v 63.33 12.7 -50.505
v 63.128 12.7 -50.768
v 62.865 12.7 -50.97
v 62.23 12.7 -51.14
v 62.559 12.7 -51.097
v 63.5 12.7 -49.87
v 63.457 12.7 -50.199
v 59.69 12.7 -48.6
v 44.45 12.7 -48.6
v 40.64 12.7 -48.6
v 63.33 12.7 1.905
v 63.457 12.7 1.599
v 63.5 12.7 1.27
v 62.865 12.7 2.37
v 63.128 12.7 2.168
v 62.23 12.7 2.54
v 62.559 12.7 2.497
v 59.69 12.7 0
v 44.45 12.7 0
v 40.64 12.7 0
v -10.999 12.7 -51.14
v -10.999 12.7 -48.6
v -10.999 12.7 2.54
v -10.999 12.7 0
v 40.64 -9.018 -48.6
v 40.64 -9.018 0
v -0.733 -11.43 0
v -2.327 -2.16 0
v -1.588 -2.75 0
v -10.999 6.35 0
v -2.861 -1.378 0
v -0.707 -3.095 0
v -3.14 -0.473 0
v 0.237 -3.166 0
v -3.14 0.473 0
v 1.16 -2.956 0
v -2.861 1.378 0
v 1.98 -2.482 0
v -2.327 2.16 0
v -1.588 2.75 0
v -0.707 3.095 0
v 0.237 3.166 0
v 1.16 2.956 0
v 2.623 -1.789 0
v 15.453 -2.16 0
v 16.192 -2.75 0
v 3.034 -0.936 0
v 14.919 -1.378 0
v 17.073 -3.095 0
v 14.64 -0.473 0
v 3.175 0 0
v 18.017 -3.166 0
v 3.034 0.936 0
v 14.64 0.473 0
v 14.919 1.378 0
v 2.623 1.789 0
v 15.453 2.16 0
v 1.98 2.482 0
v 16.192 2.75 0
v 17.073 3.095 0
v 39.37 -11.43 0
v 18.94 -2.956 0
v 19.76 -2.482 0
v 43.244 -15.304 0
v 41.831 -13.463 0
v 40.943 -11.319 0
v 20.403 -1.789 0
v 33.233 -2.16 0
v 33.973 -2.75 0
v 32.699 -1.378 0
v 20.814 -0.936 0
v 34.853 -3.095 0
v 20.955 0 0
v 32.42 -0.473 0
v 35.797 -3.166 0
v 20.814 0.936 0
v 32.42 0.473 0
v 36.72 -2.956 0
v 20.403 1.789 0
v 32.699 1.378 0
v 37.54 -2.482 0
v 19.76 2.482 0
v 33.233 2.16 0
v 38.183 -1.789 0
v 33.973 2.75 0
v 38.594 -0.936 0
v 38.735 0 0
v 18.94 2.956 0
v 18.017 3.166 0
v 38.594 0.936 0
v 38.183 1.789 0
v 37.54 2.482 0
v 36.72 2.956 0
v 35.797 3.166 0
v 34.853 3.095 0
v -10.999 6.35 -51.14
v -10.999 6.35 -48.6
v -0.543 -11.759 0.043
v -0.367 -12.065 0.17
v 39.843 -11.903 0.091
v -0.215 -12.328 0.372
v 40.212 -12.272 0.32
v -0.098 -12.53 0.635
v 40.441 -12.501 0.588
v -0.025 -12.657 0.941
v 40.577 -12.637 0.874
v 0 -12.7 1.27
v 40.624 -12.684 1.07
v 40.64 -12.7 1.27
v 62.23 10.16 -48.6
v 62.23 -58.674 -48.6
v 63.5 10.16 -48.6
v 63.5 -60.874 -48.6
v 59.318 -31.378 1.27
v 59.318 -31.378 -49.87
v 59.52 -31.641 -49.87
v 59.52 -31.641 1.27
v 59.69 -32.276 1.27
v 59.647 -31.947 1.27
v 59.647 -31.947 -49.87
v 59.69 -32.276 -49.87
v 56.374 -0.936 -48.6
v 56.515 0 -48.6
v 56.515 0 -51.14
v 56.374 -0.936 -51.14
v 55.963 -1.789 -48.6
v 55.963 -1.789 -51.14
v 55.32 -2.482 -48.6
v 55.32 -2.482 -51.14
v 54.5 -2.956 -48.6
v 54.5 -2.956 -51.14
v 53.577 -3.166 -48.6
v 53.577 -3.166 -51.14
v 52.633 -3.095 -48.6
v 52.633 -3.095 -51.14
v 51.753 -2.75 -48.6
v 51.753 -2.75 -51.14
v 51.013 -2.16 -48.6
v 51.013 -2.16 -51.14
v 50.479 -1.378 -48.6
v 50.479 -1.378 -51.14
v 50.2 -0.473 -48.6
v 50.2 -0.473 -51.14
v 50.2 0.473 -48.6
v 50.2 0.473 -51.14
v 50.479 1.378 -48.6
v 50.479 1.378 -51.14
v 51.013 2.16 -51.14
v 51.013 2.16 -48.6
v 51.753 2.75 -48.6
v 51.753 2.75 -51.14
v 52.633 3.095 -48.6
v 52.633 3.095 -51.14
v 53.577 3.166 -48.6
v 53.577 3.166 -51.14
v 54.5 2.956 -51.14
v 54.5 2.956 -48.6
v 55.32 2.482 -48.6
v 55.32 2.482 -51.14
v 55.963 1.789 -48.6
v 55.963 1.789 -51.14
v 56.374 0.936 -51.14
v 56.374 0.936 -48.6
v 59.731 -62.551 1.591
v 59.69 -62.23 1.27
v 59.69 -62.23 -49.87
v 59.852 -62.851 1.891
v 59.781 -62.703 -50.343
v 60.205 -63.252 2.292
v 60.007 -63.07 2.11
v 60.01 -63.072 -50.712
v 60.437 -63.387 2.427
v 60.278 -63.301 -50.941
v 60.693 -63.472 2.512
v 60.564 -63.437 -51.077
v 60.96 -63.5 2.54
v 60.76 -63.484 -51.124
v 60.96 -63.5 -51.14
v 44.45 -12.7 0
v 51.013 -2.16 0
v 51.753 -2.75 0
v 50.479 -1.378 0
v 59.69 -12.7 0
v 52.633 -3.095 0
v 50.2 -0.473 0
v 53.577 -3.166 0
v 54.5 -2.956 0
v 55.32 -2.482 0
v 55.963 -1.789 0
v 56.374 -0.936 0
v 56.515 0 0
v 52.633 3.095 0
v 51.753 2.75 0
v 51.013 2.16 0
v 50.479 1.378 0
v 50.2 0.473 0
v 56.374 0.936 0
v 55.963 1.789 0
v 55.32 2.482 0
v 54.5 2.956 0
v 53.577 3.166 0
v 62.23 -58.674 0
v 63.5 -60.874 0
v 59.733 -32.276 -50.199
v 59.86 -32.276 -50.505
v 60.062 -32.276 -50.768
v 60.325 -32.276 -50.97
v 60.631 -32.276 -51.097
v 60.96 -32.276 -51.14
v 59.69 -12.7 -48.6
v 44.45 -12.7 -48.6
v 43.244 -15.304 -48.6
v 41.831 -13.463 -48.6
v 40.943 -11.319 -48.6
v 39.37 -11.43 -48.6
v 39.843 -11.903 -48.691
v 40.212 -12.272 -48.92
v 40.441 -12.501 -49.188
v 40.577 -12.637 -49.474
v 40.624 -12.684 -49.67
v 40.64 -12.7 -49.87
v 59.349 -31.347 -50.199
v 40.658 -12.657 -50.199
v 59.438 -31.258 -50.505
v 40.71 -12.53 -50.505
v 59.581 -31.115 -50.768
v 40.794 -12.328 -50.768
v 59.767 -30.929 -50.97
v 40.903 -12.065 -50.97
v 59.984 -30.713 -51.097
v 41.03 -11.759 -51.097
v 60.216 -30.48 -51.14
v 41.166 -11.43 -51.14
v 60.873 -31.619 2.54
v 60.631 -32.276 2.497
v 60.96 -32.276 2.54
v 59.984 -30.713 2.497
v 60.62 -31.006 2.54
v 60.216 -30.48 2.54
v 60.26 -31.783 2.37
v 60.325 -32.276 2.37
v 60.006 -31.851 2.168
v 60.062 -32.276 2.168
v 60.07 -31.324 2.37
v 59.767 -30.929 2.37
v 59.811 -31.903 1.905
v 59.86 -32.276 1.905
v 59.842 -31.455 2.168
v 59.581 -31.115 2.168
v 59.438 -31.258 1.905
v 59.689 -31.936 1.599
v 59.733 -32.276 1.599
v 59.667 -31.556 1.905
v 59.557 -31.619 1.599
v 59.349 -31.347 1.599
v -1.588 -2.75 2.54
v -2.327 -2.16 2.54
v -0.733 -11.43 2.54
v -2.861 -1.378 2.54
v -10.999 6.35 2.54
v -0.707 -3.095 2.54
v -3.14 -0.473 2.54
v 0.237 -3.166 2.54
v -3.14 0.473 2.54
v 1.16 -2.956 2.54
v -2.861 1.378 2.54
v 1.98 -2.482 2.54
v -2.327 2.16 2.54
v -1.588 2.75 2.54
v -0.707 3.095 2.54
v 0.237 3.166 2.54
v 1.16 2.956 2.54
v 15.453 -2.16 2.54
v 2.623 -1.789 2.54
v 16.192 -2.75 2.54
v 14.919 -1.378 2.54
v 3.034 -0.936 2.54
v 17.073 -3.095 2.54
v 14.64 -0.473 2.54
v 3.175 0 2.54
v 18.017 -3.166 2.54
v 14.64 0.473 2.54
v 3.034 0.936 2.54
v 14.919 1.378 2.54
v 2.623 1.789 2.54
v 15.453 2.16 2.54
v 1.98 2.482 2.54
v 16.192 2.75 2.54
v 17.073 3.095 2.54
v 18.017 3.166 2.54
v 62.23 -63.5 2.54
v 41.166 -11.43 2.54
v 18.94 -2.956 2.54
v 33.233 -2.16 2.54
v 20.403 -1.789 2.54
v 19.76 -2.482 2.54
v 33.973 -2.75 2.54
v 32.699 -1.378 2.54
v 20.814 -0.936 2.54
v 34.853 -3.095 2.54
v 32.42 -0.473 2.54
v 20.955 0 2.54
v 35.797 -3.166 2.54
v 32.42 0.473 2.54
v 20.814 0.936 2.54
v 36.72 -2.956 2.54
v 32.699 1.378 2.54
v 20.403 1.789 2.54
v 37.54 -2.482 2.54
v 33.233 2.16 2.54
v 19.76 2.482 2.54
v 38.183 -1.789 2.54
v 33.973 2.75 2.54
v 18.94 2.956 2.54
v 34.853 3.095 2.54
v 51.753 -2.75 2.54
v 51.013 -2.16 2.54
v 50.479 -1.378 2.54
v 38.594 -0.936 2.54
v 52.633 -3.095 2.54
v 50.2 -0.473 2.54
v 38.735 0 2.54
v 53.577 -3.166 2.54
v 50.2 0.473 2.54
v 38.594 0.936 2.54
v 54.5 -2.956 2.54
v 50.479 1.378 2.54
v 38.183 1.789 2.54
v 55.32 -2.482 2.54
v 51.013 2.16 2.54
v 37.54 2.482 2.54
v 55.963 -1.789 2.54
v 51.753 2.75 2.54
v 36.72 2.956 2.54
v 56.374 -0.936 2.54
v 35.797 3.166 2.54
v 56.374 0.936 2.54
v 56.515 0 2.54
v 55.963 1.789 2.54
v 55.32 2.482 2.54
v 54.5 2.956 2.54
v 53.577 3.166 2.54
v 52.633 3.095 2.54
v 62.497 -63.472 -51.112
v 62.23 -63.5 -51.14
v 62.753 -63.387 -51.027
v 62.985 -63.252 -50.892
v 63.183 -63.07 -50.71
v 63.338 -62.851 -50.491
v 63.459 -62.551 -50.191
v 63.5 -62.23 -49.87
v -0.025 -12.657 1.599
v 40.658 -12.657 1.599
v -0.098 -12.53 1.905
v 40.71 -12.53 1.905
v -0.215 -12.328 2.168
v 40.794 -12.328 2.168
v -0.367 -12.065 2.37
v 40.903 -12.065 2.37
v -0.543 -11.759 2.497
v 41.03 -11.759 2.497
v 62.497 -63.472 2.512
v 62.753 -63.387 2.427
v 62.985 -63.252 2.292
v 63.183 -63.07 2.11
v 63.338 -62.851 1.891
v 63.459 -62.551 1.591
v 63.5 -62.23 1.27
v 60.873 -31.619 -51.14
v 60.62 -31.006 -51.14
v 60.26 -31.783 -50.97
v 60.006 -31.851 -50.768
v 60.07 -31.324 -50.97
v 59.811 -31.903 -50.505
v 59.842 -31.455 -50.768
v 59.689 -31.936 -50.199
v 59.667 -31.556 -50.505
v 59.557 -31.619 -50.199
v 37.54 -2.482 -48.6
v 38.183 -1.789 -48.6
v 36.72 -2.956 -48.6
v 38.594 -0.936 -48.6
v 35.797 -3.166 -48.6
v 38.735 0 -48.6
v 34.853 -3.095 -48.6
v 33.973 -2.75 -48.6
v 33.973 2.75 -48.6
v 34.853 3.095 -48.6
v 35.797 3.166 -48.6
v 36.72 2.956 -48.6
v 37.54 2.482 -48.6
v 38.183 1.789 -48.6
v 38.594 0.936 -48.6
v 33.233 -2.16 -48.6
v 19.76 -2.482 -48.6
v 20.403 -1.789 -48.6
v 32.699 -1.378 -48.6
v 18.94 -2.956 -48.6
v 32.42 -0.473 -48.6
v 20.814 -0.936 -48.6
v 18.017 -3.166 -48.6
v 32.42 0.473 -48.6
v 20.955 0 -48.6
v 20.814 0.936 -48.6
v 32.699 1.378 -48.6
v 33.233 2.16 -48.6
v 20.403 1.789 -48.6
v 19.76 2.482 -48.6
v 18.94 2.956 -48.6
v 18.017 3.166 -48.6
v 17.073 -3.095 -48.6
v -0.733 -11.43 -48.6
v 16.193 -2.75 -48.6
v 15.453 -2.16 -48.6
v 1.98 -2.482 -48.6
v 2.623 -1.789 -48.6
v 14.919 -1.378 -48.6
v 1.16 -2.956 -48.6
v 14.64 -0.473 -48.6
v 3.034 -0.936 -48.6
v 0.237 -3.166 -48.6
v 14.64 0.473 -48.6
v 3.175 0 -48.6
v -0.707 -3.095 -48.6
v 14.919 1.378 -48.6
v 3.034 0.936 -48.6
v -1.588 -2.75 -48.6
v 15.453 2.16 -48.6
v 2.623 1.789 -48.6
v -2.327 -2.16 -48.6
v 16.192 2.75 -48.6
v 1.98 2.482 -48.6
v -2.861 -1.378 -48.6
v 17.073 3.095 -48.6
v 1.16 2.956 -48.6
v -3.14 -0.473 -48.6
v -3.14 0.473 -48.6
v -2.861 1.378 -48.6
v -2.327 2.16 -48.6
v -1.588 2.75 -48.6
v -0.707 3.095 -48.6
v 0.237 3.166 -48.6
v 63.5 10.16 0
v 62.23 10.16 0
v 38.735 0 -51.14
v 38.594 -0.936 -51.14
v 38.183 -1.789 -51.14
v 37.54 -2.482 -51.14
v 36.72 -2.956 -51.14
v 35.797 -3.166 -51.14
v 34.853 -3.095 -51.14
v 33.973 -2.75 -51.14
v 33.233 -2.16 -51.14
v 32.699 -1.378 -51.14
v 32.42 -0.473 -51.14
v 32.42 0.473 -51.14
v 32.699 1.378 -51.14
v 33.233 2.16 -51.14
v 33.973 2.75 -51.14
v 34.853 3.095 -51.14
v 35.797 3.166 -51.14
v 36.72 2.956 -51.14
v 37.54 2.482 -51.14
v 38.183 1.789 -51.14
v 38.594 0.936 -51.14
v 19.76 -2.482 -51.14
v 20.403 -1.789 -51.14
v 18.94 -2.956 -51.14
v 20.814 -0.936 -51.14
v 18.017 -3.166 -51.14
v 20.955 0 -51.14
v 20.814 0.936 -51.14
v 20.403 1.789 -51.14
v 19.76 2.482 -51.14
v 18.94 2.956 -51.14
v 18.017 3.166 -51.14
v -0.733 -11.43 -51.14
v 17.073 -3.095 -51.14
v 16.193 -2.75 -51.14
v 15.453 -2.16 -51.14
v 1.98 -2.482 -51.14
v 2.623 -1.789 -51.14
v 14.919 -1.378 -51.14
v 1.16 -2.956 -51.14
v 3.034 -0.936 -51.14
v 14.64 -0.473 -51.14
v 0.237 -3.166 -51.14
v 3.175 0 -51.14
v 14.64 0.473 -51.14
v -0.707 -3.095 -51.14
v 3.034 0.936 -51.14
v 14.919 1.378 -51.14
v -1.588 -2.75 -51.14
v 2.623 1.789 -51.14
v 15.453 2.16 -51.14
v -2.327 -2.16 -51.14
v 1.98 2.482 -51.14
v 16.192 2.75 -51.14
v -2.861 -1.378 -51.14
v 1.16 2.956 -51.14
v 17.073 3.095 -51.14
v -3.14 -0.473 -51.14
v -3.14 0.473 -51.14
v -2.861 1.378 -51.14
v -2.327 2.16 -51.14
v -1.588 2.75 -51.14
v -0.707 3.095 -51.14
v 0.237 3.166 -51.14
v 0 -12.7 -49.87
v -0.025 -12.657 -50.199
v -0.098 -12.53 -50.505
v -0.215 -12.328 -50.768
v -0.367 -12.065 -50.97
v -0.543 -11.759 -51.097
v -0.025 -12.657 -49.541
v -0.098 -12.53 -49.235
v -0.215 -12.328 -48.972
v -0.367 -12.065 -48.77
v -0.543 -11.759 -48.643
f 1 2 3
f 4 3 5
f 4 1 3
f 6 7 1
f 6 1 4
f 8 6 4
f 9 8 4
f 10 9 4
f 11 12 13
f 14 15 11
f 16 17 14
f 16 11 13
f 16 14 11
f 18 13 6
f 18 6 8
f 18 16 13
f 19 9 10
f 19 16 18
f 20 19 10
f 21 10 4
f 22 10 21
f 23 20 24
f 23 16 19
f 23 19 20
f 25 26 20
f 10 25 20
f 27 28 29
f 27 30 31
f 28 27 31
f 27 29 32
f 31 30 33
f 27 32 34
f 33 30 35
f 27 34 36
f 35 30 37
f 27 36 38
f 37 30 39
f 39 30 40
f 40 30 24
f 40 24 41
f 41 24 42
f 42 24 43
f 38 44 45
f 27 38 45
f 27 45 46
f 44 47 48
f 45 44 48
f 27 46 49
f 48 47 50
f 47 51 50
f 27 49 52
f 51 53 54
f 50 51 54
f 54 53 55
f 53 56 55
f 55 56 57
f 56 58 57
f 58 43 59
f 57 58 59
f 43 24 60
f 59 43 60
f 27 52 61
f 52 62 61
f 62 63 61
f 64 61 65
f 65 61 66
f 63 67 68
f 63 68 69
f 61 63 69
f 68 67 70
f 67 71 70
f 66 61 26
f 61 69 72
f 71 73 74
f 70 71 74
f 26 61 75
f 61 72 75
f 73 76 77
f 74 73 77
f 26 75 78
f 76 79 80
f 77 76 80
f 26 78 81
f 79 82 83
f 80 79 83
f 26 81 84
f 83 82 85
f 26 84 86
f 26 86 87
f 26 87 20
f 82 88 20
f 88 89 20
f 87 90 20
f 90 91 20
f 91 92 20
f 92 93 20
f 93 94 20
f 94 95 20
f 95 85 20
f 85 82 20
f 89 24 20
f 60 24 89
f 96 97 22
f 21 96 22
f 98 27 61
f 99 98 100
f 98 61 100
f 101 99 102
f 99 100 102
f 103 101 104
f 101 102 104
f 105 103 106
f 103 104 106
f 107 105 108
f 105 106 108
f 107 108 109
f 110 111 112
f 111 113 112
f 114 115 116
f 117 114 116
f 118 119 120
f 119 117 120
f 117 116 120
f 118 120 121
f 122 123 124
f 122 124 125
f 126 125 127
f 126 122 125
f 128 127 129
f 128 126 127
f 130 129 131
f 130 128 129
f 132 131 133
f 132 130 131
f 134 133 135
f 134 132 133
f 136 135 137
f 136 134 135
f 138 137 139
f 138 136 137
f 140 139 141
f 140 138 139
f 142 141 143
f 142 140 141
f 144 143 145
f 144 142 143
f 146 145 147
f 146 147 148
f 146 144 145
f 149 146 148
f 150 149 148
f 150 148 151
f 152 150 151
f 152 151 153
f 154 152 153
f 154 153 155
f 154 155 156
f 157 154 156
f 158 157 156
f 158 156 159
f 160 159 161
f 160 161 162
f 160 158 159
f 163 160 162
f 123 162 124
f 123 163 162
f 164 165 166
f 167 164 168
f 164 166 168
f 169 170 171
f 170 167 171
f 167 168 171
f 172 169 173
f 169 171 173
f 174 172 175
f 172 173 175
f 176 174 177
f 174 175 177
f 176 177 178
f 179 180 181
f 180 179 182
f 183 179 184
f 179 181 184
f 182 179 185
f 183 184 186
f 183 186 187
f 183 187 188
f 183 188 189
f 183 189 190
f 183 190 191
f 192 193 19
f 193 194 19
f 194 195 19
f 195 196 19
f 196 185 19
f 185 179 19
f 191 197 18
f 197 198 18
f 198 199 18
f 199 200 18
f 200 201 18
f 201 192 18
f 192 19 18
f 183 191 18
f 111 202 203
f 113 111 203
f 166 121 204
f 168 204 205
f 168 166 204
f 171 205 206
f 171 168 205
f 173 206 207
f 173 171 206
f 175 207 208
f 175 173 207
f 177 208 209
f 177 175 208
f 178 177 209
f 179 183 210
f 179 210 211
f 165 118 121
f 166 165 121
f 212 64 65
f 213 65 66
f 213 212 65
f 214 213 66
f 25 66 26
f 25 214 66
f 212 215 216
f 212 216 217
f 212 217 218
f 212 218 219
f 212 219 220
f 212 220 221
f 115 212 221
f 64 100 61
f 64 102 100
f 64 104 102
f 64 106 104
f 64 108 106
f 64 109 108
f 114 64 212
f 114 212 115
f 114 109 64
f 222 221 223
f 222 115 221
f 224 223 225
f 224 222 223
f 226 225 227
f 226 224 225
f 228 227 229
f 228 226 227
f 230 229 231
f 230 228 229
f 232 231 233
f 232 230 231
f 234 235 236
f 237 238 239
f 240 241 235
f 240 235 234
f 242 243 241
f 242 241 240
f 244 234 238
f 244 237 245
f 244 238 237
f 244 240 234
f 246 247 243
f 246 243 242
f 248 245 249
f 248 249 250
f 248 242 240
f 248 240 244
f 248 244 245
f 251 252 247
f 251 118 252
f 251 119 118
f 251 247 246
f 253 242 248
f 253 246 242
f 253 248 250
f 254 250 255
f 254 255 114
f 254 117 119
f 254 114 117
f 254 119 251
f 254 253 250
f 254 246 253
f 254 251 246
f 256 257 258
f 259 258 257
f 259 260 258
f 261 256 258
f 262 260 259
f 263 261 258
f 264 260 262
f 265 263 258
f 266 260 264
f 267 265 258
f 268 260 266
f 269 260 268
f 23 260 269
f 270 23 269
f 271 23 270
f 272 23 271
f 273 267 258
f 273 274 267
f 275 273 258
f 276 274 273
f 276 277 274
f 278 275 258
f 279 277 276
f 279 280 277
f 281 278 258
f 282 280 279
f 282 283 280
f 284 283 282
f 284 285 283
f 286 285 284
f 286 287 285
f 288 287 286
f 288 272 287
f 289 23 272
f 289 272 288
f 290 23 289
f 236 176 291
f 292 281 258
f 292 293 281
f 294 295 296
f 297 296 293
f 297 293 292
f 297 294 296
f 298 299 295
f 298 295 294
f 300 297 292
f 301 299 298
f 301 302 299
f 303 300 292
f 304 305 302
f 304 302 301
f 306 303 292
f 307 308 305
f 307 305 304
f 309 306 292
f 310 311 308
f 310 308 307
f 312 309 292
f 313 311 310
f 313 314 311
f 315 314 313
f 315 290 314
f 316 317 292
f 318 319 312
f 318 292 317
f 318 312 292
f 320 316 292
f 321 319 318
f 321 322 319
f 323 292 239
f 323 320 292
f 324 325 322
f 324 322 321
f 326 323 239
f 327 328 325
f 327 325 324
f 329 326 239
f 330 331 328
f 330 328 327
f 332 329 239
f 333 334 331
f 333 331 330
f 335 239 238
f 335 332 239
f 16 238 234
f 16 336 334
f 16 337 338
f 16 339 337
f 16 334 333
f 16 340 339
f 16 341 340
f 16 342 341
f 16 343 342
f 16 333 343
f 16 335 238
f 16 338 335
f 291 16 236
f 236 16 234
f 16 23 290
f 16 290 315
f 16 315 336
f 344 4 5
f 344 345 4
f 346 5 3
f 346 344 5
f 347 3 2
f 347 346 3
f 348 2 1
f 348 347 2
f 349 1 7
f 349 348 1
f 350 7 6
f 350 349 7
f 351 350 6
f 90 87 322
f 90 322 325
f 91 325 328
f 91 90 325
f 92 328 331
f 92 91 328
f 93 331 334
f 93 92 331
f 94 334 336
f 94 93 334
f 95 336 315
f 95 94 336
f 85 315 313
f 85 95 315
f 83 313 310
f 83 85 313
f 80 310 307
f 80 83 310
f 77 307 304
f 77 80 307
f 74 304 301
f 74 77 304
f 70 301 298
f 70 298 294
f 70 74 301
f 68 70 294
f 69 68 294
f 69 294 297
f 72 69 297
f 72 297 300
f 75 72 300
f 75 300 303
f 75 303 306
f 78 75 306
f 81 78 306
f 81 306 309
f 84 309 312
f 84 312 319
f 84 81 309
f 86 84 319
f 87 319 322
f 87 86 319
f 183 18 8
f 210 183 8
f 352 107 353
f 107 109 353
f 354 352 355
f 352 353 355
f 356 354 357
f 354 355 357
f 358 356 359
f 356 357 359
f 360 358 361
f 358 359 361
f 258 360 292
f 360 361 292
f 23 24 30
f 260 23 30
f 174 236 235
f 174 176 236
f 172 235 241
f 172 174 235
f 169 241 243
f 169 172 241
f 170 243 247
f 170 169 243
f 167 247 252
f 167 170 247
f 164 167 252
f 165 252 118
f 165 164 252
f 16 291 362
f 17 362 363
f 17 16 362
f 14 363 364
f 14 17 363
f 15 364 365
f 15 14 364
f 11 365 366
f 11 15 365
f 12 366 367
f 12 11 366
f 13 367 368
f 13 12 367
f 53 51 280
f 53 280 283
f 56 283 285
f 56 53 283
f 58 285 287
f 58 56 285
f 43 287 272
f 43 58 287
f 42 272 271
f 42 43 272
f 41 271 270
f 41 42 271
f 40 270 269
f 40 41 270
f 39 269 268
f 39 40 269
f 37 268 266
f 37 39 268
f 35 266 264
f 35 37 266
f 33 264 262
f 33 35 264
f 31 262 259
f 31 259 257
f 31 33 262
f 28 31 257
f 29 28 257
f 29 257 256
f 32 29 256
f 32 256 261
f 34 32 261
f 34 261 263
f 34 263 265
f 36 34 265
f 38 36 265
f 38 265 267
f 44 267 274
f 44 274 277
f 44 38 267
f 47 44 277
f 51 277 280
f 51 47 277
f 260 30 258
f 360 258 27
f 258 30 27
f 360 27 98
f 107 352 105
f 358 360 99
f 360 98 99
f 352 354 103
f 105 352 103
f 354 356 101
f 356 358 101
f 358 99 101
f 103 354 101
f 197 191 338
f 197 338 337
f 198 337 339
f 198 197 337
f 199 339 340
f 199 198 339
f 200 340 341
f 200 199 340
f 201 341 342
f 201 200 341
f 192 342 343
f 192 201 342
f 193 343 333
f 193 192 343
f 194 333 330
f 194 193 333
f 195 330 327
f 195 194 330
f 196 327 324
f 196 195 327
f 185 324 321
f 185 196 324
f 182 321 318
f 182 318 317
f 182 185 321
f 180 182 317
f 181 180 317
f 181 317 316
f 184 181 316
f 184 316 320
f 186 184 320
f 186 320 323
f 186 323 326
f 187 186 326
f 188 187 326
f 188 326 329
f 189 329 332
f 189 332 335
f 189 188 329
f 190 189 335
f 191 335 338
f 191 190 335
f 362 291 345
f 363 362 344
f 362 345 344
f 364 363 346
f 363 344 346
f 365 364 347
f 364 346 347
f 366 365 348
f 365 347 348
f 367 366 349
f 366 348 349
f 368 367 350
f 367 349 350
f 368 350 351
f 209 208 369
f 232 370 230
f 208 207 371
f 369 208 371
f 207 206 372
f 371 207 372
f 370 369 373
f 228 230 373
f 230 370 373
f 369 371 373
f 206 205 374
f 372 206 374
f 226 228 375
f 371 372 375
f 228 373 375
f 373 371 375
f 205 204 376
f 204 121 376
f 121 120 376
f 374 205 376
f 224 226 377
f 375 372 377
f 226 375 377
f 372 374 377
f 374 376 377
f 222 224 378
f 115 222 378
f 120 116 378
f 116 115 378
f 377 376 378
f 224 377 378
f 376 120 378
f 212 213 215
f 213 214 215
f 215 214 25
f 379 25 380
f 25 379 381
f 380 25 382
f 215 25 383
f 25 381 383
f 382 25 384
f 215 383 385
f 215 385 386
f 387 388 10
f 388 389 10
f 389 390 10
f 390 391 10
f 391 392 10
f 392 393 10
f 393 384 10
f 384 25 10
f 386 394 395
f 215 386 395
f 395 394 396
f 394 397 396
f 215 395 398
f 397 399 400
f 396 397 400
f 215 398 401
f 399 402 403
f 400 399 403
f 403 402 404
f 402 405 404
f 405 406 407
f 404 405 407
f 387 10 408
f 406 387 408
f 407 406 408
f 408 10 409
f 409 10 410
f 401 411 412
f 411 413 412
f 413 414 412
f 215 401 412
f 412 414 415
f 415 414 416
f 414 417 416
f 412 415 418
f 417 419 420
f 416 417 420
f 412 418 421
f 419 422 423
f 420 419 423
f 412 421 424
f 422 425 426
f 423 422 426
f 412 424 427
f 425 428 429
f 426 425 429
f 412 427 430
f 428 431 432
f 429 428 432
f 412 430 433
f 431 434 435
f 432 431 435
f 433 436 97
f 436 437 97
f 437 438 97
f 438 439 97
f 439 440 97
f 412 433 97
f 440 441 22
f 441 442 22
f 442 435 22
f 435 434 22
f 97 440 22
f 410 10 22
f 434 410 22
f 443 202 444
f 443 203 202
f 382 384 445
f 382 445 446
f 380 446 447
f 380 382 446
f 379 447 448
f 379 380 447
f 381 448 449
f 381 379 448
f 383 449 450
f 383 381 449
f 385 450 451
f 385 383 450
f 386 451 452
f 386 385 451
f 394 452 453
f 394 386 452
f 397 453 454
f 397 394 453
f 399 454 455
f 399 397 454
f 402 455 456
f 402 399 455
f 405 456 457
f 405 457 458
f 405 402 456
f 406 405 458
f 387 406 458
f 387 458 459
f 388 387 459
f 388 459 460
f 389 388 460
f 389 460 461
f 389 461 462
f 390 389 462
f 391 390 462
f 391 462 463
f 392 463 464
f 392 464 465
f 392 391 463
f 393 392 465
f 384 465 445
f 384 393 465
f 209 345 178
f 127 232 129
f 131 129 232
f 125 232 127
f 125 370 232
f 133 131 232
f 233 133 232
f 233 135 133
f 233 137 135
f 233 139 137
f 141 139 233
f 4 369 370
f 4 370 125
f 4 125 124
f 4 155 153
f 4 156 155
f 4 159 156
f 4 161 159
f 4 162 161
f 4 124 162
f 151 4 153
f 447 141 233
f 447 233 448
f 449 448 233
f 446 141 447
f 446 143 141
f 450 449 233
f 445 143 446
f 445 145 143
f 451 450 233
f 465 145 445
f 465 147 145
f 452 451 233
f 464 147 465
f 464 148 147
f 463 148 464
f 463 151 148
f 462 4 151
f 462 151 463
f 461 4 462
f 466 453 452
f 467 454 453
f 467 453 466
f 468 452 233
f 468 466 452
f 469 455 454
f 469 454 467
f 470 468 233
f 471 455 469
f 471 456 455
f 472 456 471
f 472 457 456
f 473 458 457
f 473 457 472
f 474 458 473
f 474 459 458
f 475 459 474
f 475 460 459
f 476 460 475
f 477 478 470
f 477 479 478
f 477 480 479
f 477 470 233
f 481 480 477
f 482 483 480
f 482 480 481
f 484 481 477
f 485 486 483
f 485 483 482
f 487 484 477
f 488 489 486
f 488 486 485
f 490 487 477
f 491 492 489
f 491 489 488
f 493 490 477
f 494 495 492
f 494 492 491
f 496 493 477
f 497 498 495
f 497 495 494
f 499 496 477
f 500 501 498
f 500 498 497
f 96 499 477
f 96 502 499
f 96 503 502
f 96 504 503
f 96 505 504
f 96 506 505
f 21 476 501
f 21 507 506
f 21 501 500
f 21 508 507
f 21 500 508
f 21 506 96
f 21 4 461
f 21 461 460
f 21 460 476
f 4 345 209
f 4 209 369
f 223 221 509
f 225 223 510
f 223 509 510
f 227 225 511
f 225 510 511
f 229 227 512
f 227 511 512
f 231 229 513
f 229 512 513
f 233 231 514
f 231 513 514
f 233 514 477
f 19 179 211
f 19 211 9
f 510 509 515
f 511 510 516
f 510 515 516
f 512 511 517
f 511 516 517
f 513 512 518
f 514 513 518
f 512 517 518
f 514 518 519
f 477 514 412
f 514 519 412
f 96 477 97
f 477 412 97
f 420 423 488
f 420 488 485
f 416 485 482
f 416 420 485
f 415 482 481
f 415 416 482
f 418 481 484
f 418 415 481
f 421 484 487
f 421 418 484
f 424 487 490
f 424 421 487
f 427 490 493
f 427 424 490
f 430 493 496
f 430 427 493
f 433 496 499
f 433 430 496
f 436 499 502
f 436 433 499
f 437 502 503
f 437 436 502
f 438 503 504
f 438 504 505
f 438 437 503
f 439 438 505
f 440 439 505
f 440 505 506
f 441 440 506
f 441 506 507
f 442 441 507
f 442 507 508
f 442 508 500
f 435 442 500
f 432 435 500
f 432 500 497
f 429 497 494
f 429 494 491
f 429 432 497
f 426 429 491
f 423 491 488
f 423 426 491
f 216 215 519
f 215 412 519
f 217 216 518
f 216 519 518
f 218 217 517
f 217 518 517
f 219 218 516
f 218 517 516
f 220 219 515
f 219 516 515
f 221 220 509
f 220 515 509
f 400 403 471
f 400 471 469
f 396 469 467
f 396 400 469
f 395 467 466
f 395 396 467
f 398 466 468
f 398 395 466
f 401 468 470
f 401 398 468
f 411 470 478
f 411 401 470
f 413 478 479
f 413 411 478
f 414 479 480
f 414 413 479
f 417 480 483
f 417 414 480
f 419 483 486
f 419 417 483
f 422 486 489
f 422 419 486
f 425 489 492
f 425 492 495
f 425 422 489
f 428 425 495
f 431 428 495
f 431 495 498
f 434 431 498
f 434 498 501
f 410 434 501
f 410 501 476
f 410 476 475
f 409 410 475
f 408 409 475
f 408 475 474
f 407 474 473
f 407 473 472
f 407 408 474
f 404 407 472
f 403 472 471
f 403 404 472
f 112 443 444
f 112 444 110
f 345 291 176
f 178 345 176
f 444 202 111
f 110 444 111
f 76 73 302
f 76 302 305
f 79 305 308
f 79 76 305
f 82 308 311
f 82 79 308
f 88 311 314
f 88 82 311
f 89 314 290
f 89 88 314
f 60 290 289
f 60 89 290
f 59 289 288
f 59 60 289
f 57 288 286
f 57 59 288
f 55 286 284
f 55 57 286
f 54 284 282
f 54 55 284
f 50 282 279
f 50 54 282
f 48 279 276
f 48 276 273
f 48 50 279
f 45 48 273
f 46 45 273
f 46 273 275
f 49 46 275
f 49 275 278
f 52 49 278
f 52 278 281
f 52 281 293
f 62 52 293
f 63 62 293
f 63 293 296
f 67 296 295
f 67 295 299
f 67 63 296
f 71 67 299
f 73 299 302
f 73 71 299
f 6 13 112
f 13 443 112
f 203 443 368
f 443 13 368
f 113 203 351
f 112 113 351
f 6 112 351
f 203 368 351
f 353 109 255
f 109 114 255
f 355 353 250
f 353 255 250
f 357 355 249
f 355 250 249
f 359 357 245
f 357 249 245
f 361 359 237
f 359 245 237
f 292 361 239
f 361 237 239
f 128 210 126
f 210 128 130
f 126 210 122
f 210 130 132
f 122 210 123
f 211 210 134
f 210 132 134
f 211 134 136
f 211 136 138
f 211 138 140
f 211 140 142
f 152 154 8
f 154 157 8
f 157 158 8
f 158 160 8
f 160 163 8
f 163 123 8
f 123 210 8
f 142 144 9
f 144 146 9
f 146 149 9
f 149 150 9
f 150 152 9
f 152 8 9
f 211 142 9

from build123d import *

# Parameters (mm, degrees)
SKETCH2_R           = 3.175
BOSS_EXTRUDE1_DEPTH = 2.54
SKETCH3_R           = 3.175
BOSS_EXTRUDE2_DEPTH = 2.54
SKETCH4_W           = 3.81
SKETCH4_H           = 25.4
BOSS_EXTRUDE3_DEPTH = 48.6
BOSS_EXTRUDE4_DEPTH = 50.8
LPATTERN1_COUNT     = 2
LPATTERN1_PITCH     = 19.05
SKETCH6_W           = 48.6
SKETCH6_H           = 71.12
CUT_EXTRUDE1_DEPTH  = 1.27
BOSS_EXTRUDE5_REACH = 106.623
FILLET1_R           = 8.89
FILLET2_R           = 1.27
CHAMFER1_SIZE       = 2.286
CHAMFER1_SIZE_2     = 1.319822715


# Some blends are built 0.0001 mm under size
with BuildPart() as part:
    # Sketch2 → Boss-Extrude1 (new body)
    with BuildSketch(Plane.XY):
        Polygon((0, -12.7), (63.5, -12.7), (63.5, 12.7), (0, 12.7), (-10.998522628, 12.7), (-10.998522628, 6.35), align=None)
        Circle(SKETCH2_R, mode=Mode.SUBTRACT)
        with Locations((17.78, 0)):
            Circle(SKETCH2_R, mode=Mode.SUBTRACT)
        with Locations((35.56, 0)):
            Circle(SKETCH2_R, mode=Mode.SUBTRACT)
        with Locations((53.34, 0)):
            Circle(SKETCH2_R, mode=Mode.SUBTRACT)
    extrude(amount=BOSS_EXTRUDE1_DEPTH)



with BuildPart() as body_2:
    # Sketch3 → Boss-Extrude2 (new body)
    with BuildSketch(Plane(origin=(0, 0, -48.6), x_dir=(-1, 0, 0), z_dir=(0, 0, -1))):
        Polygon((10.998522628, 12.7), (-63.5, 12.7), (-63.5, -12.7), (0, -12.7), (10.998522628, 6.35), align=None)
        with Locations(Location((0, 0, 0), (0, 0, 180))):
            Circle(SKETCH3_R, mode=Mode.SUBTRACT)
        with Locations(Location((-53.34, 0, 0), (0, 0, 180))):
            Circle(SKETCH3_R, mode=Mode.SUBTRACT)
        with Locations(Location((-35.56, 0, 0), (0, 0, 180))):
            Circle(SKETCH3_R, mode=Mode.SUBTRACT)
        with Locations(Location((-17.78, 0, 0), (0, 0, 180))):
            Circle(SKETCH3_R, mode=Mode.SUBTRACT)
    extrude(amount=BOSS_EXTRUDE2_DEPTH)


with BuildPart() as part_1:
    add(part.part)

    add(body_2.part)  # Boss-Extrude3 merges body 2
    # Sketch4 → Boss-Extrude3 (add)
    with BuildSketch(Plane(origin=(0, 0, 0), x_dir=(-1, 0, 0), z_dir=(0, 0, -1))):
        with Locations((-61.595, 0)):
            Rectangle(SKETCH4_W, SKETCH4_H)
    boss_extrude3 = extrude(amount=BOSS_EXTRUDE3_DEPTH)

    # Sketch5 → Boss-Extrude4 (add)
    with BuildSketch(Plane.XZ.offset(12.7)):
        Polygon((59.69, -48.6), (59.69, 0), (59.69, 2.54), (63.5, 2.54), (63.5, -51.14), (59.69, -51.14), align=None)
    extrude(amount=BOSS_EXTRUDE4_DEPTH)

    # LPattern1: Boss-Extrude3 ×2
    with Locations(*[(-i * LPATTERN1_PITCH, 0, 0) for i in range(1, LPATTERN1_COUNT)]):
        add(boss_extrude3)

    # Sketch6 → Cut-Extrude1 (cut)
    with BuildSketch(Plane(origin=(63.5, 0, 0), x_dir=(0, 0, -1), z_dir=(1, 0, 0))):
        with Locations((24.3, -25.4)):
            Rectangle(SKETCH6_W, SKETCH6_H)
    extrude(amount=-CUT_EXTRUDE1_DEPTH, mode=Mode.SUBTRACT)

    # Boss-Extrude5: up to this face of the body (flat: up to its plane)
    boss_extrude5_end = Plane(part_1.part.faces().sort_by_distance((31.808357107, -3.617906471, -51.14))[0])
    # Sketch7 → Boss-Extrude5 (add, up to the picked face)
    with BuildSketch(Plane.XY.offset(2.54), mode=Mode.PRIVATE) as boss_extrude5_sk1:
        Polygon((40.64, -12.7), (59.69, -31.75), (59.69, -12.7), align=None)
    boss_extrude5_tool1 = split(extrude(boss_extrude5_sk1.sketch, amount=-BOSS_EXTRUDE5_REACH, mode=Mode.PRIVATE), bisect_by=boss_extrude5_end, keep=Keep.BOTH, mode=Mode.PRIVATE)
    add(boss_extrude5_tool1.solids().sort_by(Axis((53.34, -19.05, 2.54), (0, 0, -1)))[0])

    # Fillet1
    fillet1_edges = [part_1.edges().sort_by_distance(p)[0] for p in [
        (40.64, -12.7, -24.3),
    ]]
    fillet(fillet1_edges, radius=FILLET1_R)

    # Fillet2
    fillet2_edges = [part_1.edges().sort_by_distance(p)[0] for p in [
        (20.32, -12.7, -51.14),
        (50.165, -22.225, 2.54),
        (50.165, -22.225, -51.14),
        (59.69, -31.75, -24.3),
        (20.32, -12.7, 0),
        (20.32, -12.7, 2.54),
        (63.5, -25.4, 2.54),
        (63.5, -25.4, -51.14),
        (59.69, -47.625, -51.14),
        (59.69, -47.625, 2.54),
        (59.69, -63.5, -24.3),
        (63.5, -63.5, -24.3),
        (20.32, -12.7, -48.6),
    ]]
    fillet(fillet2_edges, radius=FILLET2_R - 0.0001)  # a hair under: the kernel refuses the full size

    # Chamfer1
    # the kernel refuses this chamfer: 2.286, 1.319822715 mm, written as the material it adds along each edge
    with BuildSketch(Plane(origin=(62.23, -60.96, 0), x_dir=(-0.01932676561270189, 0.9998132206222078, 0), z_dir=(0, 0, -1))) as chamfer1_piece_1_section:
        Polygon((CHAMFER1_SIZE * 0.999813220622, CHAMFER1_SIZE * 0.0193267656127), (-CHAMFER1_SIZE_2 * 0.0193267656181, CHAMFER1_SIZE_2 * 0.999813220901), (0, 0), align=None)
    chamfer1_piece_1 = extrude(amount=48.6, mode=Mode.PRIVATE)
    chamfer1_piece_1 = split(chamfer1_piece_1, bisect_by=Plane(origin=(63.5, -60.18781376, -24.3), z_dir=(-1, 0, 0)), keep=Keep.TOP, mode=Mode.PRIVATE)
    add(chamfer1_piece_1)


solid = part_1.part
